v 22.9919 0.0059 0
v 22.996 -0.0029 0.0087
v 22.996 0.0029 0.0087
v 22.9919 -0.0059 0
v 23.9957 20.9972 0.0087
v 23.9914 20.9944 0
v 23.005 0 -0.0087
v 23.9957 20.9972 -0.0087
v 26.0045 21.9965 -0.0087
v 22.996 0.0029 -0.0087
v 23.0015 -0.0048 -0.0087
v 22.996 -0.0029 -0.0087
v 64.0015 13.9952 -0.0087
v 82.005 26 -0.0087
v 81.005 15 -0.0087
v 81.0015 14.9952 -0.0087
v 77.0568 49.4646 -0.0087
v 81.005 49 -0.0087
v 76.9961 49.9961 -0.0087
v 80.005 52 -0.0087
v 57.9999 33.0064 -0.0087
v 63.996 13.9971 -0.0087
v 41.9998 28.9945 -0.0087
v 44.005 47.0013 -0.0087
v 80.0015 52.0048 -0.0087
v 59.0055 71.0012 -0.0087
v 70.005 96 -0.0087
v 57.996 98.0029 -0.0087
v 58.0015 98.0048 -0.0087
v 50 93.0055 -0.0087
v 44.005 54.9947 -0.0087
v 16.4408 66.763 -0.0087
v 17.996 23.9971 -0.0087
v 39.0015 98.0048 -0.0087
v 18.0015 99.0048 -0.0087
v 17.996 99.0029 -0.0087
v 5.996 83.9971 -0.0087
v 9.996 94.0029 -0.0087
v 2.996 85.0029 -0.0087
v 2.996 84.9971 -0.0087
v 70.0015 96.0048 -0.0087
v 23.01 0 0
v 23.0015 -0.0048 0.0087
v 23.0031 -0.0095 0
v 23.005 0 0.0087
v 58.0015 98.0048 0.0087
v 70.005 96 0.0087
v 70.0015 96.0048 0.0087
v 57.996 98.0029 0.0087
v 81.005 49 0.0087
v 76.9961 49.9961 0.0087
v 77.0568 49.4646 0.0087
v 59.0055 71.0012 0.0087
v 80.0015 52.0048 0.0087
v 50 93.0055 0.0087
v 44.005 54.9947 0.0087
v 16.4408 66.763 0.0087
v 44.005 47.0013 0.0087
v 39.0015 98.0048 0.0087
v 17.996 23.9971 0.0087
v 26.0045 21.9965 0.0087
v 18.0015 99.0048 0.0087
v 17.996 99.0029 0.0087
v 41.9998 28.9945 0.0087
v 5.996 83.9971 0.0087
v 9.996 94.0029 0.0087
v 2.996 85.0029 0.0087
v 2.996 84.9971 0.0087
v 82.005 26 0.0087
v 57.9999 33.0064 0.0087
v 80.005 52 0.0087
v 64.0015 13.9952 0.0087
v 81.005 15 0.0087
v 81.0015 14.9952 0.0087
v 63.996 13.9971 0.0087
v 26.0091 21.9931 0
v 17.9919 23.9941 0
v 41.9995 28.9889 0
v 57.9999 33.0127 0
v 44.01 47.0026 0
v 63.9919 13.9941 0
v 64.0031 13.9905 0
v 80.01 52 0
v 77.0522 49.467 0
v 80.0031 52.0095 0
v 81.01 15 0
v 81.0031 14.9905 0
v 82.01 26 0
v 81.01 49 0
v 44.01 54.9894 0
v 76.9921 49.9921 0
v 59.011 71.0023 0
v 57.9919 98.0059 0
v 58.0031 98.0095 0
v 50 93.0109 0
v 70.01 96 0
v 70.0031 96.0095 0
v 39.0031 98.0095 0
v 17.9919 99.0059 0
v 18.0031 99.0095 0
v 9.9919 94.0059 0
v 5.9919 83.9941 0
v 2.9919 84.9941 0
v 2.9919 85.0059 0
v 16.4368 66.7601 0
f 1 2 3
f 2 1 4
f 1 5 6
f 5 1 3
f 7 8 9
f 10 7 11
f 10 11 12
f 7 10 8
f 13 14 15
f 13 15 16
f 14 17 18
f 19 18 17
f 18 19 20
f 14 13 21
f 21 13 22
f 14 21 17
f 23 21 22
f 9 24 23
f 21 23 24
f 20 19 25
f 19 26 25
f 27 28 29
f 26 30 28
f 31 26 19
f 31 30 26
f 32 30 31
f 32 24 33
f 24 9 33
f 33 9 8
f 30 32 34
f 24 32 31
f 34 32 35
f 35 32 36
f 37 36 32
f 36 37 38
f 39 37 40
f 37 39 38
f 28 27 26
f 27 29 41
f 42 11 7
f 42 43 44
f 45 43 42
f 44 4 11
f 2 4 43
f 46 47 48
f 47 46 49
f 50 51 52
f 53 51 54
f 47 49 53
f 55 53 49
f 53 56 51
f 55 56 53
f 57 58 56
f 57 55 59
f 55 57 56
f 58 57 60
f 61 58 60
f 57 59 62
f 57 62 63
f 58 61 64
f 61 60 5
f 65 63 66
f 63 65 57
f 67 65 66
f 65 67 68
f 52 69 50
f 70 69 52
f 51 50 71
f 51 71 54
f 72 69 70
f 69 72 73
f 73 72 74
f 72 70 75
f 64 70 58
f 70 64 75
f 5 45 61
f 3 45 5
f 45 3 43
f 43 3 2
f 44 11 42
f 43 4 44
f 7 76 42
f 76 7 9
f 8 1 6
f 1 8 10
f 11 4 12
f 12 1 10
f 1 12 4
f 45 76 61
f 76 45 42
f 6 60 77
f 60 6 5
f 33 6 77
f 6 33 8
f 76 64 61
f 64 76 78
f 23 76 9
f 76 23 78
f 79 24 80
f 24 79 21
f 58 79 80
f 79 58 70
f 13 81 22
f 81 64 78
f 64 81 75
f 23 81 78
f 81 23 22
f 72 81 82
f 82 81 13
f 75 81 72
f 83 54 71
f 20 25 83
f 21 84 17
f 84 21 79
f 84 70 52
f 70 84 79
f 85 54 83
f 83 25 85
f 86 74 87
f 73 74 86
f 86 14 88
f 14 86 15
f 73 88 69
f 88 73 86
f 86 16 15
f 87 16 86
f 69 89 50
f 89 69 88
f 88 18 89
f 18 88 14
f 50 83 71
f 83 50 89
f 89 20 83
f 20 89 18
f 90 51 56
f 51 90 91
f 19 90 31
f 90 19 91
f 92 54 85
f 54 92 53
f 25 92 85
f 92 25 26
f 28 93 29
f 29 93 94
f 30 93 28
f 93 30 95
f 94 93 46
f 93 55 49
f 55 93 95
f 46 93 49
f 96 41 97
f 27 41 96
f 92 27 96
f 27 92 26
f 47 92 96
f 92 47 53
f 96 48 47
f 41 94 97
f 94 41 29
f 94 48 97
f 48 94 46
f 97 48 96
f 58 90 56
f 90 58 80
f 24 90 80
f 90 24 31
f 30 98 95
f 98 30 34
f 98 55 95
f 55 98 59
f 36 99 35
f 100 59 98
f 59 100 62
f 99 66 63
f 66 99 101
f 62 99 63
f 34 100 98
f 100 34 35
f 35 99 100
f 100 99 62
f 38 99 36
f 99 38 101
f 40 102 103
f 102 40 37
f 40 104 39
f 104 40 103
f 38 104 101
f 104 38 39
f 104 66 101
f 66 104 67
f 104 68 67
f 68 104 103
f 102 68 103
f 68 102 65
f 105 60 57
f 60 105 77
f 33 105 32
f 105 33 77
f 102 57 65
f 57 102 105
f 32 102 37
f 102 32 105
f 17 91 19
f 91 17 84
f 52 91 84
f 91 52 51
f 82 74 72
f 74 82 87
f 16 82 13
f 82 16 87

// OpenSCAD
color([0.8628581448400192,0.48332959823715915,0.760144685355809]) hull(){
    translate([23,0]) sphere(0.01);
    translate([26,22]) sphere(0.01);
    translate([24,21]) sphere(0.01);
}
color([0.17349489212301172,0.7172022627612936,0.8738126079333703]) hull(){
    translate([26,22]) sphere(0.01);
    translate([18,24]) sphere(0.01);
    translate([24,21]) sphere(0.01);
}
color([0.7407081150283871,0.1750257628023656,0.7717601752613227]) hull(){
    translate([18,24]) sphere(0.01);
    translate([26,51]) sphere(0.01);
    translate([26,22]) sphere(0.01);
}
color([0.17462951192396858,0.1365817917740666,0.790898096633715]) hull(){
    translate([26,22]) sphere(0.01);
    translate([26,51]) sphere(0.01);
    translate([42,29]) sphere(0.01);
}
color([0.05068813004758421,0.2747417086491215,0.9775332998919624]) hull(){
    translate([26,51]) sphere(0.01);
    translate([35,48]) sphere(0.01);
    translate([42,29]) sphere(0.01);
}
color([0.3741990821064618,0.5760507248775137,0.9764706525564496]) hull(){
    translate([42,29]) sphere(0.01);
    translate([35,48]) sphere(0.01);
    translate([44,47]) sphere(0.01);
}
color([0.6412339051880062,0.9116486495874845,0.653753263894704]) hull(){
    translate([42,29]) sphere(0.01);
    translate([44,47]) sphere(0.01);
    translate([58,33]) sphere(0.01);
}
color([0.7391387592304974,0.7973855488942889,0.8338139774032114]) hull(){
    translate([42,29]) sphere(0.01);
    translate([58,33]) sphere(0.01);
    translate([64,14]) sphere(0.01);
}
color([0.5893068505654989,0.9387852932083598,0.6768105799142914]) hull(){
    translate([64,14]) sphere(0.01);
    translate([58,33]) sphere(0.01);
    translate([82,26]) sphere(0.01);
}
color([0.26314077483765086,0.6459233453457565,0.8790980253849315]) hull(){
    translate([58,33]) sphere(0.01);
    translate([82,26]) sphere(0.01);
    translate([80,52]) sphere(0.01);
}
color([0.15362837418895858,0.31061588741770185,0.8944360920803668]) hull(){
    translate([82,26]) sphere(0.01);
    translate([81,15]) sphere(0.01);
    translate([72,20]) sphere(0.01);
}
color([0.2723573567519545,0.029723278769515638,0.14137415559711708]) hull(){
    translate([82,26]) sphere(0.01);
    translate([72,20]) sphere(0.01);
    translate([68,15]) sphere(0.01);
}
color([0.24588268133825053,0.688989335517289,0.012833732972479917]) hull(){
    translate([68,15]) sphere(0.01);
    translate([72,20]) sphere(0.01);
    translate([64,14]) sphere(0.01);
}
color([0.4317421186444177,0.09476467904542085,0.2539030370426648]) hull(){
    translate([81,15]) sphere(0.01);
    translate([82,26]) sphere(0.01);
    translate([81,49]) sphere(0.01);
}
color([0.4433940275438375,0.6374619106411259,0.7629796076056016]) hull(){
    translate([81,49]) sphere(0.01);
    translate([82,26]) sphere(0.01);
    translate([80,52]) sphere(0.01);
}
color([0.33974962563874156,0.40746011996126574,0.8304662499681598]) hull(){
    translate([80,52]) sphere(0.01);
    translate([77,50]) sphere(0.01);
    translate([81,49]) sphere(0.01);
}
color([0.03737370743548629,0.7771030741686201,0.7450583503430228]) hull(){
    translate([77,50]) sphere(0.01);
    translate([80,52]) sphere(0.01);
    translate([44,55]) sphere(0.01);
}
color([0.7664898273962963,0.9635930682622835,0.37370940745190284]) hull(){
    translate([44,55]) sphere(0.01);
    translate([80,52]) sphere(0.01);
    translate([59,71]) sphere(0.01);
}
color([0.5269890278256799,0.7391003970289415,0.05440955639390033]) hull(){
    translate([44,55]) sphere(0.01);
    translate([59,71]) sphere(0.01);
    translate([50,93]) sphere(0.01);
}
color([0.16266859334294614,0.5860851836586503,0.6198514899274227]) hull(){
    translate([50,93]) sphere(0.01);
    translate([59,71]) sphere(0.01);
    translate([58,98]) sphere(0.01);
}
color([0.617768007375954,0.696939114622172,0.24987298892689824]) hull(){
    translate([58,98]) sphere(0.01);
    translate([59,71]) sphere(0.01);
    translate([70,96]) sphere(0.01);
}
color([0.10727882524928667,0.2542017095222042,0.647326061070541]) hull(){
    translate([59,71]) sphere(0.01);
    translate([77,50]) sphere(0.01);
    translate([44,55]) sphere(0.01);
}
color([0.6145129037504997,0.7319188036610002,0.2916410122362264]) hull(){
    translate([44,55]) sphere(0.01);
    translate([44,47]) sphere(0.01);
    translate([35,48]) sphere(0.01);
}
color([0.46410792523938205,0.009432899408237327,0.2601511175245954]) hull(){
    translate([44,55]) sphere(0.01);
    translate([35,48]) sphere(0.01);
    translate([30,57]) sphere(0.01);
}
color([0.9661595458779266,0.8212204941997756,0.9717572370221306]) hull(){
    translate([44,55]) sphere(0.01);
    translate([30,57]) sphere(0.01);
    translate([18,58]) sphere(0.01);
}
color([0.7094339661906762,0.3687560915635114,0.91551222113324]) hull(){
    translate([18,58]) sphere(0.01);
    translate([26,51]) sphere(0.01);
    translate([30,57]) sphere(0.01);
}
color([0.32058638357595914,0.6286861798780845,0.3438006598659582]) hull(){
    translate([26,51]) sphere(0.01);
    translate([30,57]) sphere(0.01);
    translate([35,48]) sphere(0.01);
}
color([0.6764002586894835,0.49002609359593985,0.6828992283474875]) hull(){
    translate([18,58]) sphere(0.01);
    translate([30,57]) sphere(0.01);
    translate([20,83]) sphere(0.01);
}
color([0.9457740861038292,0.48113916365283227,0.11743485119222763]) hull(){
    translate([20,83]) sphere(0.01);
    translate([30,57]) sphere(0.01);
    translate([22,90]) sphere(0.01);
}
color([0.6785611781392669,0.3559530637070777,0.24479389591231593]) hull(){
    translate([22,90]) sphere(0.01);
    translate([30,57]) sphere(0.01);
    translate([39,98]) sphere(0.01);
}
color([0.19718264729666257,0.5265513877214916,0.7820972605832109]) hull(){
    translate([39,98]) sphere(0.01);
    translate([30,57]) sphere(0.01);
    translate([50,93]) sphere(0.01);
}
color([0.016540899859545988,0.2649906914184337,0.6195666266963675]) hull(){
    translate([50,93]) sphere(0.01);
    translate([30,57]) sphere(0.01);
    translate([44,55]) sphere(0.01);
}
color([0.9400622663204184,0.8580807518186289,0.33004078082379396]) hull(){
    translate([58,98]) sphere(0.01);
    translate([70,96]) sphere(0.01);
    translate([50,93]) sphere(0.01);
}
color([0.9838273149753736,0.1297919343219498,0.6092048694604357]) hull(){
    translate([20,83]) sphere(0.01);
    translate([22,90]) sphere(0.01);
    translate([39,98]) sphere(0.01);
}
color([0.4362496777237921,0.204876863896859,0.7703581377154641]) hull(){
    translate([20,83]) sphere(0.01);
    translate([39,98]) sphere(0.01);
    translate([10,94]) sphere(0.01);
}
color([0.24016059236570497,0.9925708955515705,0.45030012798788]) hull(){
    translate([10,94]) sphere(0.01);
    translate([39,98]) sphere(0.01);
    translate([18,99]) sphere(0.01);
}
color([0.6687095525163839,0.6084946124880205,0.9354113971140408]) hull(){
    translate([39,98]) sphere(0.01);
    translate([18,99]) sphere(0.01);
    translate([22,90]) sphere(0.01);
}
color([0.40170597484563164,0.9257642462472301,0.7352475143256585]) hull(){
    translate([20,83]) sphere(0.01);
    translate([10,94]) sphere(0.01);
    translate([6,84]) sphere(0.01);
}
color([0.9040805991886998,0.8303556425691195,0.04360117165228117]) hull(){
    translate([6,84]) sphere(0.01);
    translate([10,94]) sphere(0.01);
    translate([3,85]) sphere(0.01);
}
color([0.19461635406133904,0.24937487606759356,0.948798389089598]) hull(){
    translate([10,94]) sphere(0.01);
    translate([18,99]) sphere(0.01);
    translate([3,85]) sphere(0.01);
}
color([0.463582495028668,0.8326751819056648,0.9518902994268229]) hull(){
    translate([16,79]) sphere(0.01);
    translate([20,83]) sphere(0.01);
    translate([6,84]) sphere(0.01);
}
color([0.6590575290507751,0.08125165305796267,0.4650668984349794]) hull(){
    translate([18,58]) sphere(0.01);
    translate([16,79]) sphere(0.01);
    translate([20,83]) sphere(0.01);
}
color([0.7959185631816963,0.11921151794914897,0.3955919798495292]) hull(){
    translate([18,58]) sphere(0.01);
    translate([16,79]) sphere(0.01);
    translate([18,24]) sphere(0.01);
}
color([0.9677071171037346,0.6413149765805175,0.6980206654320958]) hull(){
    translate([18,24]) sphere(0.01);
    translate([16,79]) sphere(0.01);
    translate([26,51]) sphere(0.01);
}
color([0.8040097371122532,0.02969664254607307,0.6148562424214081]) hull(){
    translate([26,51]) sphere(0.01);
    translate([16,79]) sphere(0.01);
    translate([6,84]) sphere(0.01);
}
color([0.8448719577880454,0.4679553852673959,0.08973588053163917]) hull(){
    translate([6,84]) sphere(0.01);
    translate([3,85]) sphere(0.01);
    translate([18,99]) sphere(0.01);
}
color([0.4324405658485233,0.6252018299529586,0.7035550007040374]) hull(){
    translate([81,15]) sphere(0.01);
    translate([81,49]) sphere(0.01);
    translate([77,50]) sphere(0.01);
}
color([0.5393448057318809,0.2527674186168355,0.3363254213178022]) hull(){
    translate([72,20]) sphere(0.01);
    translate([81,15]) sphere(0.01);
    translate([68,15]) sphere(0.01);
}
color([0.11910676957782207,0.14794946950639198,0.11827804449452717]) hull(){
    translate([64,14]) sphere(0.01);
    translate([68,15]) sphere(0.01);
    translate([81,15]) sphere(0.01);
}
